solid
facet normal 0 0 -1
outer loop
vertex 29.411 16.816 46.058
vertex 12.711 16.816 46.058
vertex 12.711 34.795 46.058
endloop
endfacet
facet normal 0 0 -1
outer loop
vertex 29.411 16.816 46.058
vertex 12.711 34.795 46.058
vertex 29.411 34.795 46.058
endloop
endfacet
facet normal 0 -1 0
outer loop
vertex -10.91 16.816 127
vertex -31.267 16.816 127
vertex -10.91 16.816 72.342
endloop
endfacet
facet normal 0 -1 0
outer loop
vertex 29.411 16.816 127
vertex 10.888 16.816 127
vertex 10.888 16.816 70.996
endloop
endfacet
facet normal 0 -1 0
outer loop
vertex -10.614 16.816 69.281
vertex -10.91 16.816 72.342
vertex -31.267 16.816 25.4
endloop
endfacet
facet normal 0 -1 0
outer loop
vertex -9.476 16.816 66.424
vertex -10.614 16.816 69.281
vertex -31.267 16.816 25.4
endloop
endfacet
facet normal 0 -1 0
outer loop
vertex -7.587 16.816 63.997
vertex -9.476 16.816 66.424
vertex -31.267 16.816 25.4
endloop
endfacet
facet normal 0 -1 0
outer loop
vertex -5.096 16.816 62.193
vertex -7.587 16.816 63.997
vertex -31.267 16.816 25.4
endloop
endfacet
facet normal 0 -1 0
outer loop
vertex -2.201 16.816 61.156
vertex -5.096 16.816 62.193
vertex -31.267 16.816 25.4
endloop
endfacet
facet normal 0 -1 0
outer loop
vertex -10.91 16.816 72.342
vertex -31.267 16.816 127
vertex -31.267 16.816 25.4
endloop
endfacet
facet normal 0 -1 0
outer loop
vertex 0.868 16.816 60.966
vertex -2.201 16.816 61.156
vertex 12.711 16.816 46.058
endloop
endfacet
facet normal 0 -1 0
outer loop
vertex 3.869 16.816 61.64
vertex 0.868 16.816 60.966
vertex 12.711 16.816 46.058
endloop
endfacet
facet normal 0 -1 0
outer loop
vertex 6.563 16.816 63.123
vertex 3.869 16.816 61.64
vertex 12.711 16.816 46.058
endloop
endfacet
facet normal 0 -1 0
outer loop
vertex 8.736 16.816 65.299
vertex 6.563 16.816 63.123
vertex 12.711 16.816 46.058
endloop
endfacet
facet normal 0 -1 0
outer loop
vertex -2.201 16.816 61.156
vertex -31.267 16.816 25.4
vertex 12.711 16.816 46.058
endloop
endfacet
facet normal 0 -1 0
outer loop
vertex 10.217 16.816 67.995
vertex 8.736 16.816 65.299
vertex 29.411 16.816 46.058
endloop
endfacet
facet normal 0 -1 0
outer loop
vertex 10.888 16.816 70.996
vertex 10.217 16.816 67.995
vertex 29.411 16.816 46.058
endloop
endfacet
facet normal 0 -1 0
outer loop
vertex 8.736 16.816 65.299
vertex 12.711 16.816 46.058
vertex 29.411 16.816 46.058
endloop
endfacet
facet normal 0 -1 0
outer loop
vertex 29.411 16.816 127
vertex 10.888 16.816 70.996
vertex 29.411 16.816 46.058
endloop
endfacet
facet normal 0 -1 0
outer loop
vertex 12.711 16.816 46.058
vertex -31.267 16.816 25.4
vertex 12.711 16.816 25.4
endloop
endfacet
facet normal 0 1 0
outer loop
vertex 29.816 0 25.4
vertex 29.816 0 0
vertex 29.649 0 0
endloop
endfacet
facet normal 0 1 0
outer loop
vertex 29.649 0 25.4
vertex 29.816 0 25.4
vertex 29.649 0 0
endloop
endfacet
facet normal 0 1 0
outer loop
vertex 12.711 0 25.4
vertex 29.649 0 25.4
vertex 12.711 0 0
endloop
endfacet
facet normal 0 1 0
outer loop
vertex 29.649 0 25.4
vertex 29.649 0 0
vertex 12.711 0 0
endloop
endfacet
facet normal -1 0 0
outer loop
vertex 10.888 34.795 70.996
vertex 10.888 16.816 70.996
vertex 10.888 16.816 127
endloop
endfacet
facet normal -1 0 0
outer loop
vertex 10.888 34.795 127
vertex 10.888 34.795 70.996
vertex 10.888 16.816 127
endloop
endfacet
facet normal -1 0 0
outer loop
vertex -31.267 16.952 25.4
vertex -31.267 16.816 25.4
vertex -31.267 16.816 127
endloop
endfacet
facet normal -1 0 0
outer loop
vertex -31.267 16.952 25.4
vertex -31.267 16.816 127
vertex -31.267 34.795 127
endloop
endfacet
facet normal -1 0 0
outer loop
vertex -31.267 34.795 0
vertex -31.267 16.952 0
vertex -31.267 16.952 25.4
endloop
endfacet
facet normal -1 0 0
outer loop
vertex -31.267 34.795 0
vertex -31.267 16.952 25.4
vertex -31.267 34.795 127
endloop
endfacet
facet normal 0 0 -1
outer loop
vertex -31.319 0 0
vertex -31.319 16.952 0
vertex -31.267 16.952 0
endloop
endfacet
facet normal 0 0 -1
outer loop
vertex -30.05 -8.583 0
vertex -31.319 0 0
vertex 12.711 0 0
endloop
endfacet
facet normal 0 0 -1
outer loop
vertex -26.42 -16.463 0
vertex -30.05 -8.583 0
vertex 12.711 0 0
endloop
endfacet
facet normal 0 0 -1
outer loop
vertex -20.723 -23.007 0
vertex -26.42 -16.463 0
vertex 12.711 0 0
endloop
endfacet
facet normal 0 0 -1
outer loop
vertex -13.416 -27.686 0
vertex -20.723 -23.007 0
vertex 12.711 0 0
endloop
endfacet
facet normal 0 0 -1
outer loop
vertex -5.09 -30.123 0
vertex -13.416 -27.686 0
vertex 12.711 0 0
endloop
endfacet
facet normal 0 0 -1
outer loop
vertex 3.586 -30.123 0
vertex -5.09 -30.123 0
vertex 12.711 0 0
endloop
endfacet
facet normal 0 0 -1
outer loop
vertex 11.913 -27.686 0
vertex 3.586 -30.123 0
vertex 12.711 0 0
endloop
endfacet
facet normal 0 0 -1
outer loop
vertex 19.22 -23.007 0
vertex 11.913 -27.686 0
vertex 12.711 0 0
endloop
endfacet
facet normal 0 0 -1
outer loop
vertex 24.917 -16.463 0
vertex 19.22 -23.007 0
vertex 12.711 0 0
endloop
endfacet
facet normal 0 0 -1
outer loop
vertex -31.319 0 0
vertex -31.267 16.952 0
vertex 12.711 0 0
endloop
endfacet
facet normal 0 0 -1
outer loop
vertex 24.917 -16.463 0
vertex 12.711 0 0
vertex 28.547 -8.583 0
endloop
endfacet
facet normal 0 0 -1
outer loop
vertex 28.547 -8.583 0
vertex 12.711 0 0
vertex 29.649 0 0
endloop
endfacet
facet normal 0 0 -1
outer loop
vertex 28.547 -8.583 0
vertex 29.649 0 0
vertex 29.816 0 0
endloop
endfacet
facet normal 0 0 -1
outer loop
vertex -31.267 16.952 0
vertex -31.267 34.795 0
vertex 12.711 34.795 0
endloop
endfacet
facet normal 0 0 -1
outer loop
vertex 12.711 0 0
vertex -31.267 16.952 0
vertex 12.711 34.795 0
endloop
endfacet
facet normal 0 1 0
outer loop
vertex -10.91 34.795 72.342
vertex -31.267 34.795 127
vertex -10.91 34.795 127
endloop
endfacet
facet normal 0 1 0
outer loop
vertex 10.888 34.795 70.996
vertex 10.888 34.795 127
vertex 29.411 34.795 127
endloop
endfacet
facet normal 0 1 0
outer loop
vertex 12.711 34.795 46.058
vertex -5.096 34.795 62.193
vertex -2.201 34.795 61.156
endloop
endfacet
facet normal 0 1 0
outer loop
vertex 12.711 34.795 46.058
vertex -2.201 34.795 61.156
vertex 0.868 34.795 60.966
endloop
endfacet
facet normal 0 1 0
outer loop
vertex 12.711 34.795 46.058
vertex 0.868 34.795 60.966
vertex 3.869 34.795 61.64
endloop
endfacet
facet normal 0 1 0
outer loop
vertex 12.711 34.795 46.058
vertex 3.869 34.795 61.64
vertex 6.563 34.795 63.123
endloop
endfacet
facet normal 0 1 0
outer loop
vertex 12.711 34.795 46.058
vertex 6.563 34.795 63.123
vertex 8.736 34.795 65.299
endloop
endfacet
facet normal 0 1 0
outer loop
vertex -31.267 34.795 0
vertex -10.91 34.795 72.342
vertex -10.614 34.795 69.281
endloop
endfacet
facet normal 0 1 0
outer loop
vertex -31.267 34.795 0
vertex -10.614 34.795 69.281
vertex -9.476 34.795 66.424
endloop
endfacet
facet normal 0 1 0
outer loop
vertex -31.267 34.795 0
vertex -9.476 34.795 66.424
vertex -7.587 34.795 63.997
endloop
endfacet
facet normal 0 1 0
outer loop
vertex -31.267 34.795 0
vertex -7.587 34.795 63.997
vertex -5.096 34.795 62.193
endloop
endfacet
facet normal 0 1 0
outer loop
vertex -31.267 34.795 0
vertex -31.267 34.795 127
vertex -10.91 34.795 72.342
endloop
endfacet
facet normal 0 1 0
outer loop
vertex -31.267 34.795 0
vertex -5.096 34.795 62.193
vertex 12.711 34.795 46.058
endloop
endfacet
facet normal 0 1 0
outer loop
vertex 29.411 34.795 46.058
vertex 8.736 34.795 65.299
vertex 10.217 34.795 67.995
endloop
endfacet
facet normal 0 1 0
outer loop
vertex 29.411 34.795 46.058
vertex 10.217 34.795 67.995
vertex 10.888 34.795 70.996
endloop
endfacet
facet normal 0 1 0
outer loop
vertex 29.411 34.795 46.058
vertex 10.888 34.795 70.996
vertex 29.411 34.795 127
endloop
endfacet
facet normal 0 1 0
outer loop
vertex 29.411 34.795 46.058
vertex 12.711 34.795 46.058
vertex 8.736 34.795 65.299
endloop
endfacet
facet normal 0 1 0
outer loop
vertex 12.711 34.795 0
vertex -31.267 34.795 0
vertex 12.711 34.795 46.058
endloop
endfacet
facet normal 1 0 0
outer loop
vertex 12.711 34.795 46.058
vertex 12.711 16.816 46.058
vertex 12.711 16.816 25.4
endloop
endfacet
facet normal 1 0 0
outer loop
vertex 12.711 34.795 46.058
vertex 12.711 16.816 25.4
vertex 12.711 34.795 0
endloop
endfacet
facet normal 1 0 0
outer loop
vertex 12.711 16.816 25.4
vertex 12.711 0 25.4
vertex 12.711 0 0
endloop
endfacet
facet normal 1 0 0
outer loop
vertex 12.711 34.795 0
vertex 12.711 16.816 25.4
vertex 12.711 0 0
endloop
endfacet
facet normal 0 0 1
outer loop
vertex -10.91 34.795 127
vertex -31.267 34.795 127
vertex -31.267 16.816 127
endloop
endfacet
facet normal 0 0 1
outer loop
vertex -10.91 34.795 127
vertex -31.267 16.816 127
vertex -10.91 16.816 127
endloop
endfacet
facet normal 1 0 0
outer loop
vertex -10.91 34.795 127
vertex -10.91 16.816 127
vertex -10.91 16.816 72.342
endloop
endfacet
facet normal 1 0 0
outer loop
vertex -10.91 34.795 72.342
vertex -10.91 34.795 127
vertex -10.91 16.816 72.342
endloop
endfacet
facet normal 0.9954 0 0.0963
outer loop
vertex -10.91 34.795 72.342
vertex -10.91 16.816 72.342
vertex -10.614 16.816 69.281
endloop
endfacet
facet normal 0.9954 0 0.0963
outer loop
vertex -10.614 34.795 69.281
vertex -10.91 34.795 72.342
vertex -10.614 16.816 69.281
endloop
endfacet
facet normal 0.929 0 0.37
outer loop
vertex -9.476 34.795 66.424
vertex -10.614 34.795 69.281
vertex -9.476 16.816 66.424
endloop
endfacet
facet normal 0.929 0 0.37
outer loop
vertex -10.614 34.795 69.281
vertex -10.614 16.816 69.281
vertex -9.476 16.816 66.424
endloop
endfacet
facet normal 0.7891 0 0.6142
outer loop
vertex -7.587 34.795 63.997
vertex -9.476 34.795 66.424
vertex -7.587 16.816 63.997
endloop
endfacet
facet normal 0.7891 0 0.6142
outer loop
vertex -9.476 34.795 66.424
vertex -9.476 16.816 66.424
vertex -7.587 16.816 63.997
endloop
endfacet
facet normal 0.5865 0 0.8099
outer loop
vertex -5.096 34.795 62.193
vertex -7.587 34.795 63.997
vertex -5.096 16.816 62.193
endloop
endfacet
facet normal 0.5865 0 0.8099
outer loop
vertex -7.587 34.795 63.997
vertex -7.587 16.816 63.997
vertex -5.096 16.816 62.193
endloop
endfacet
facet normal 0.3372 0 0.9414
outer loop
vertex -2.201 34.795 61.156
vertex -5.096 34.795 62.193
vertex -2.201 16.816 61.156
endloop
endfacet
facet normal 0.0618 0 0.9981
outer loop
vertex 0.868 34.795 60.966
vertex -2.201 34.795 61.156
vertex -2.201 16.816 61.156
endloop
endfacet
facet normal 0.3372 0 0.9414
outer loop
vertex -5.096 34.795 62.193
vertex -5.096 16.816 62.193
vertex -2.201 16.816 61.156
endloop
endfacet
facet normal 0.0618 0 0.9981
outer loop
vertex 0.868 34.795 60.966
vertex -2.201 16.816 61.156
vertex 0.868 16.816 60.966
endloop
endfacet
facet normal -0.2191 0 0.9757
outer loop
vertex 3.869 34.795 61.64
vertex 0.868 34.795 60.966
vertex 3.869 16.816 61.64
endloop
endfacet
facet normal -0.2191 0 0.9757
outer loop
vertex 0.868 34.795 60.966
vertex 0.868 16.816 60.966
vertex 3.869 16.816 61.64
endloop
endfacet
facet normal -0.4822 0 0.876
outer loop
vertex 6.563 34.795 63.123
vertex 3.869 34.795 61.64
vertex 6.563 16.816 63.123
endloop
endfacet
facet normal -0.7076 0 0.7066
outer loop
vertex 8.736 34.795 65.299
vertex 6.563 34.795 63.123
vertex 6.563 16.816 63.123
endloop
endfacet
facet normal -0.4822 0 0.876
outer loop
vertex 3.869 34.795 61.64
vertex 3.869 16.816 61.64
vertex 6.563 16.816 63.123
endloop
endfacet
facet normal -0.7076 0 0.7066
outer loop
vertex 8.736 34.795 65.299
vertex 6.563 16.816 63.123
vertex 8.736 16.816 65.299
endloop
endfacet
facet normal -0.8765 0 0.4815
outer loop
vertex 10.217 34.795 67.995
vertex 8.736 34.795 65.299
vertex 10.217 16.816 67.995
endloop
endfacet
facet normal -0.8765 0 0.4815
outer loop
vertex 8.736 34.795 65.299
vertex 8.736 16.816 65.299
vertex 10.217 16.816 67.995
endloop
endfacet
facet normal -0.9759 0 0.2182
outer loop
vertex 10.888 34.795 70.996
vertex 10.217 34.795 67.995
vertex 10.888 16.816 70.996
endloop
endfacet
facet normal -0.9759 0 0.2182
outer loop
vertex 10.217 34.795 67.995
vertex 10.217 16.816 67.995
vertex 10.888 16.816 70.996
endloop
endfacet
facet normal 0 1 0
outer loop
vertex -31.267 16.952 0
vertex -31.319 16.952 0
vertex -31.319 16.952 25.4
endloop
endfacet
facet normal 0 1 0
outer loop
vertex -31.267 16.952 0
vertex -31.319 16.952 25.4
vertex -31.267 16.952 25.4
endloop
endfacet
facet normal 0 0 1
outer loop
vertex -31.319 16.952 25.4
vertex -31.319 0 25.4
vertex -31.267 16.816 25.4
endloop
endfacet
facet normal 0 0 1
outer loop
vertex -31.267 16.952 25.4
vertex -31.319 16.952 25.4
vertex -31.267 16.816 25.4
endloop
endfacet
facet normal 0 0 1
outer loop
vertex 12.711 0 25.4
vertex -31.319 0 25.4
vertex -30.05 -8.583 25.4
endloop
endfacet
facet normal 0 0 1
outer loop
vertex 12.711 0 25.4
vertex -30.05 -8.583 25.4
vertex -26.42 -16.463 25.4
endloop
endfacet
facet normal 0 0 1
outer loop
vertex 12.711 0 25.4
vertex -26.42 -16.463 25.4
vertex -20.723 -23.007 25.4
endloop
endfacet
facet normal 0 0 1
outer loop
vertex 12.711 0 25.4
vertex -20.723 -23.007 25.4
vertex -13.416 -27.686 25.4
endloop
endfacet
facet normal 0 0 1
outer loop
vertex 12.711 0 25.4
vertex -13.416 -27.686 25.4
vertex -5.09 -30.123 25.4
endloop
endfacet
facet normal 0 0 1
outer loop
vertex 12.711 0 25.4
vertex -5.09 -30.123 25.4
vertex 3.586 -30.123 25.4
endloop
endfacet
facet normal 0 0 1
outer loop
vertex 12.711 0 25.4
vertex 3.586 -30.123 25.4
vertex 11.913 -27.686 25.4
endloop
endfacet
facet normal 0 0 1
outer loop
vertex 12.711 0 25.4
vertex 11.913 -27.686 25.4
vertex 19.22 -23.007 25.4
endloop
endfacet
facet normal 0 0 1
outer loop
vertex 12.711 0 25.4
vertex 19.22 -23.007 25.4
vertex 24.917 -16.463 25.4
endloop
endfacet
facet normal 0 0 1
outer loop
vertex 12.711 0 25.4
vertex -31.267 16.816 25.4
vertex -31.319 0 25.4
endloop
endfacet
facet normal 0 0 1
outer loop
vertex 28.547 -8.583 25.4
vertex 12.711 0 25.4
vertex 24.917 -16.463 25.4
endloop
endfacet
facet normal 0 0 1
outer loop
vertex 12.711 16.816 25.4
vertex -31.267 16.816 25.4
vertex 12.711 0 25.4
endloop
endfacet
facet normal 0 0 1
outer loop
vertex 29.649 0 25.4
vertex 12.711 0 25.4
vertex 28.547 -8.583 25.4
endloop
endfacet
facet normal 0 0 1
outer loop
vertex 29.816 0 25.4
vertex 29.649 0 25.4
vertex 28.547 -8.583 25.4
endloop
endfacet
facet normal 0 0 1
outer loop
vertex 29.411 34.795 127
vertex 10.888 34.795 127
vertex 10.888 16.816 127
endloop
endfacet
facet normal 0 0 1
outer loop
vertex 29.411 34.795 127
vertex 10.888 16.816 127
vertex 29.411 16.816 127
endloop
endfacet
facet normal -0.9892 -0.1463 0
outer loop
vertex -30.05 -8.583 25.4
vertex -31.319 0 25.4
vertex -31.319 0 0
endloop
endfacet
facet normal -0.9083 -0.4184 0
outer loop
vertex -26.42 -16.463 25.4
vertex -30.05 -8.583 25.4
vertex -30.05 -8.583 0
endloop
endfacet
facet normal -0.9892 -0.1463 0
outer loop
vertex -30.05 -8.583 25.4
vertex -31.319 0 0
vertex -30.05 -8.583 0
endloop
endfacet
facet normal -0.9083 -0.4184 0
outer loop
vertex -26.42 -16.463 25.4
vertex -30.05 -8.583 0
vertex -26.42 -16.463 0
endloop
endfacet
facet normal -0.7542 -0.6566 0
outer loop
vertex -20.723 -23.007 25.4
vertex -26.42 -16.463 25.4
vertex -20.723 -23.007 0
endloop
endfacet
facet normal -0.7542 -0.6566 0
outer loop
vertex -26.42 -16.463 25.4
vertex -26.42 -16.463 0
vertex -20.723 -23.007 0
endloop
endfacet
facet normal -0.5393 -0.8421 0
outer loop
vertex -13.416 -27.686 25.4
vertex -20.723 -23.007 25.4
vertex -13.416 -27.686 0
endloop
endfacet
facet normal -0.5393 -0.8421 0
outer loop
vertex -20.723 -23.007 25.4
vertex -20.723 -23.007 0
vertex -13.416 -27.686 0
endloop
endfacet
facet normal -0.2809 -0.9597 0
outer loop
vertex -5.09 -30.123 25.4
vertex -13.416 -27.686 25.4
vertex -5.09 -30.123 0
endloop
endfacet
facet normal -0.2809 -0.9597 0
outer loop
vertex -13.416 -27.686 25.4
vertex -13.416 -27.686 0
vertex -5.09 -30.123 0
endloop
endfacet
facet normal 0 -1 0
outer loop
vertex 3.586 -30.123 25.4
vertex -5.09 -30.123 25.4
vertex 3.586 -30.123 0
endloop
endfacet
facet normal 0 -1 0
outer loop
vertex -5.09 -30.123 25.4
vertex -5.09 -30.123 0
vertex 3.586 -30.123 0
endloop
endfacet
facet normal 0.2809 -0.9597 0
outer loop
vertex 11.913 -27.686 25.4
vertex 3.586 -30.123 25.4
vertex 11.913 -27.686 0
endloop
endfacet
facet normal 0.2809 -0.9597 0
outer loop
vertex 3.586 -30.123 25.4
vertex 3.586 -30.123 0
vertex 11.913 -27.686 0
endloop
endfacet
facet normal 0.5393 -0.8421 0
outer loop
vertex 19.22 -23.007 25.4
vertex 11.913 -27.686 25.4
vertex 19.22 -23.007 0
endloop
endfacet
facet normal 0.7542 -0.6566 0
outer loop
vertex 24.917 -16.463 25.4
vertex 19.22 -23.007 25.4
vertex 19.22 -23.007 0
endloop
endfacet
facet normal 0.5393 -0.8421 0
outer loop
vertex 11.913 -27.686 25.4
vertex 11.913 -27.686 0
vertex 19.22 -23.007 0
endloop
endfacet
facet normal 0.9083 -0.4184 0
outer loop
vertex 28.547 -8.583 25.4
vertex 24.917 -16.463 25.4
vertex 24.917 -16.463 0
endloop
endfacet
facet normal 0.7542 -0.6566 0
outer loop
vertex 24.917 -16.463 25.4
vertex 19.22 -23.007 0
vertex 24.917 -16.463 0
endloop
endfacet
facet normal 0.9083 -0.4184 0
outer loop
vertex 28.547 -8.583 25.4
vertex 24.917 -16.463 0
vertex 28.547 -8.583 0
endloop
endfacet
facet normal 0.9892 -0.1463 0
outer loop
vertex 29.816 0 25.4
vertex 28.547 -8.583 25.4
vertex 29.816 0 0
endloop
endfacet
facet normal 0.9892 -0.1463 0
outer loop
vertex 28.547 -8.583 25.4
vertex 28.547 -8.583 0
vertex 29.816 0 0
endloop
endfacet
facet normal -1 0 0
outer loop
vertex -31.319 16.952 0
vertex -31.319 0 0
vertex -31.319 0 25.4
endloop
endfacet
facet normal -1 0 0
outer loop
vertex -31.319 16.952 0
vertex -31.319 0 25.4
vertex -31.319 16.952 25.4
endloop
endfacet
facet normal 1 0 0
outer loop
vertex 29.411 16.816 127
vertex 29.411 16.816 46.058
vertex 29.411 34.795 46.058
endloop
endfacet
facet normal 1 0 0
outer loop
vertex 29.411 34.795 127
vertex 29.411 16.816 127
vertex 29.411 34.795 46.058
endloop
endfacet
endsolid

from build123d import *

# Parameters (mm, degrees)
F1_DEPTH  = 25.4
F2_W      = 60.9679538757
F2_H      = 16.9523619115
F3_DEPTH  = 25.4
F4_W      = 17.1053176746
F4_H      = 16.9523619115
F5_DEPTH  = 25.4
F6_W      = 60.6785267591
F6_H      = 17.9788209498
F7_DEPTH  = 127
F8_W      = 16.7008666322
F8_H      = 20.6584424436
F8_H_2    = 25.4
F9_DEPTH  = 25.4
F11_DEPTH = 25.4


with BuildPart() as f1:
    # F0 (on Top) → F1 (new body)
    with BuildSketch(Plane.XY):
        with BuildLine():
            Line((29.8158377409, 0), (-31.3191562891, 0))
            ThreePointArc((-31.3191562891, 0), (-0.7516592741, -30.4326055801), (29.8158377409, 0))
        make_face()
    extrude(amount=F1_DEPTH)

    # F2 (on Top) → F3 (join)
    with BuildSketch(Plane.XY):
        with Locations((-0.8351793513, 8.4761809558)):
            Rectangle(F2_W, F2_H)
    extrude(amount=F3_DEPTH)

    # F4 (on face) → F5 (cut)
    with BuildSketch(Plane.XY.offset(25.4)):
        with Locations((21.2631789036, 8.4761809558)):
            Rectangle(F4_W, F4_H)
    extrude(amount=-F5_DEPTH, mode=Mode.SUBTRACT)

    # F6 (on Top) → F7 (join)
    with BuildSketch(Plane.XY):
        with Locations((-0.9278766811, 25.8058961481)):
            Rectangle(F6_W, F6_H)
    extrude(amount=F7_DEPTH)

    # F8 (on face) → F9 (cut)
    with BuildSketch(Plane.XZ.offset(-16.8164856732)):
        with Locations((21.0609533824, 35.7292212218)):
            Rectangle(F8_W, F8_H)
        with Locations((21.0609533824, 12.7)):
            Rectangle(F8_W, F8_H_2)
    extrude(amount=-F9_DEPTH, mode=Mode.SUBTRACT)

    # F10 (on face) → F11 (cut)
    with BuildSketch(Plane.XZ.offset(-16.8164856732)):
        with BuildLine():
            Line((-10.910176672, 127), (-10.910176672, 72.342030704))
            ThreePointArc((-10.910176672, 72.342030704), (-0.6730834345, 60.9522454092), (10.8875039349, 70.9960547807))
            Line((10.8875039349, 70.9960547807), (10.8875039349, 127))
            Line((10.8875039349, 127), (-10.910176672, 127))
        make_face()
    extrude(amount=-F11_DEPTH, mode=Mode.SUBTRACT)


solid = f1.part
